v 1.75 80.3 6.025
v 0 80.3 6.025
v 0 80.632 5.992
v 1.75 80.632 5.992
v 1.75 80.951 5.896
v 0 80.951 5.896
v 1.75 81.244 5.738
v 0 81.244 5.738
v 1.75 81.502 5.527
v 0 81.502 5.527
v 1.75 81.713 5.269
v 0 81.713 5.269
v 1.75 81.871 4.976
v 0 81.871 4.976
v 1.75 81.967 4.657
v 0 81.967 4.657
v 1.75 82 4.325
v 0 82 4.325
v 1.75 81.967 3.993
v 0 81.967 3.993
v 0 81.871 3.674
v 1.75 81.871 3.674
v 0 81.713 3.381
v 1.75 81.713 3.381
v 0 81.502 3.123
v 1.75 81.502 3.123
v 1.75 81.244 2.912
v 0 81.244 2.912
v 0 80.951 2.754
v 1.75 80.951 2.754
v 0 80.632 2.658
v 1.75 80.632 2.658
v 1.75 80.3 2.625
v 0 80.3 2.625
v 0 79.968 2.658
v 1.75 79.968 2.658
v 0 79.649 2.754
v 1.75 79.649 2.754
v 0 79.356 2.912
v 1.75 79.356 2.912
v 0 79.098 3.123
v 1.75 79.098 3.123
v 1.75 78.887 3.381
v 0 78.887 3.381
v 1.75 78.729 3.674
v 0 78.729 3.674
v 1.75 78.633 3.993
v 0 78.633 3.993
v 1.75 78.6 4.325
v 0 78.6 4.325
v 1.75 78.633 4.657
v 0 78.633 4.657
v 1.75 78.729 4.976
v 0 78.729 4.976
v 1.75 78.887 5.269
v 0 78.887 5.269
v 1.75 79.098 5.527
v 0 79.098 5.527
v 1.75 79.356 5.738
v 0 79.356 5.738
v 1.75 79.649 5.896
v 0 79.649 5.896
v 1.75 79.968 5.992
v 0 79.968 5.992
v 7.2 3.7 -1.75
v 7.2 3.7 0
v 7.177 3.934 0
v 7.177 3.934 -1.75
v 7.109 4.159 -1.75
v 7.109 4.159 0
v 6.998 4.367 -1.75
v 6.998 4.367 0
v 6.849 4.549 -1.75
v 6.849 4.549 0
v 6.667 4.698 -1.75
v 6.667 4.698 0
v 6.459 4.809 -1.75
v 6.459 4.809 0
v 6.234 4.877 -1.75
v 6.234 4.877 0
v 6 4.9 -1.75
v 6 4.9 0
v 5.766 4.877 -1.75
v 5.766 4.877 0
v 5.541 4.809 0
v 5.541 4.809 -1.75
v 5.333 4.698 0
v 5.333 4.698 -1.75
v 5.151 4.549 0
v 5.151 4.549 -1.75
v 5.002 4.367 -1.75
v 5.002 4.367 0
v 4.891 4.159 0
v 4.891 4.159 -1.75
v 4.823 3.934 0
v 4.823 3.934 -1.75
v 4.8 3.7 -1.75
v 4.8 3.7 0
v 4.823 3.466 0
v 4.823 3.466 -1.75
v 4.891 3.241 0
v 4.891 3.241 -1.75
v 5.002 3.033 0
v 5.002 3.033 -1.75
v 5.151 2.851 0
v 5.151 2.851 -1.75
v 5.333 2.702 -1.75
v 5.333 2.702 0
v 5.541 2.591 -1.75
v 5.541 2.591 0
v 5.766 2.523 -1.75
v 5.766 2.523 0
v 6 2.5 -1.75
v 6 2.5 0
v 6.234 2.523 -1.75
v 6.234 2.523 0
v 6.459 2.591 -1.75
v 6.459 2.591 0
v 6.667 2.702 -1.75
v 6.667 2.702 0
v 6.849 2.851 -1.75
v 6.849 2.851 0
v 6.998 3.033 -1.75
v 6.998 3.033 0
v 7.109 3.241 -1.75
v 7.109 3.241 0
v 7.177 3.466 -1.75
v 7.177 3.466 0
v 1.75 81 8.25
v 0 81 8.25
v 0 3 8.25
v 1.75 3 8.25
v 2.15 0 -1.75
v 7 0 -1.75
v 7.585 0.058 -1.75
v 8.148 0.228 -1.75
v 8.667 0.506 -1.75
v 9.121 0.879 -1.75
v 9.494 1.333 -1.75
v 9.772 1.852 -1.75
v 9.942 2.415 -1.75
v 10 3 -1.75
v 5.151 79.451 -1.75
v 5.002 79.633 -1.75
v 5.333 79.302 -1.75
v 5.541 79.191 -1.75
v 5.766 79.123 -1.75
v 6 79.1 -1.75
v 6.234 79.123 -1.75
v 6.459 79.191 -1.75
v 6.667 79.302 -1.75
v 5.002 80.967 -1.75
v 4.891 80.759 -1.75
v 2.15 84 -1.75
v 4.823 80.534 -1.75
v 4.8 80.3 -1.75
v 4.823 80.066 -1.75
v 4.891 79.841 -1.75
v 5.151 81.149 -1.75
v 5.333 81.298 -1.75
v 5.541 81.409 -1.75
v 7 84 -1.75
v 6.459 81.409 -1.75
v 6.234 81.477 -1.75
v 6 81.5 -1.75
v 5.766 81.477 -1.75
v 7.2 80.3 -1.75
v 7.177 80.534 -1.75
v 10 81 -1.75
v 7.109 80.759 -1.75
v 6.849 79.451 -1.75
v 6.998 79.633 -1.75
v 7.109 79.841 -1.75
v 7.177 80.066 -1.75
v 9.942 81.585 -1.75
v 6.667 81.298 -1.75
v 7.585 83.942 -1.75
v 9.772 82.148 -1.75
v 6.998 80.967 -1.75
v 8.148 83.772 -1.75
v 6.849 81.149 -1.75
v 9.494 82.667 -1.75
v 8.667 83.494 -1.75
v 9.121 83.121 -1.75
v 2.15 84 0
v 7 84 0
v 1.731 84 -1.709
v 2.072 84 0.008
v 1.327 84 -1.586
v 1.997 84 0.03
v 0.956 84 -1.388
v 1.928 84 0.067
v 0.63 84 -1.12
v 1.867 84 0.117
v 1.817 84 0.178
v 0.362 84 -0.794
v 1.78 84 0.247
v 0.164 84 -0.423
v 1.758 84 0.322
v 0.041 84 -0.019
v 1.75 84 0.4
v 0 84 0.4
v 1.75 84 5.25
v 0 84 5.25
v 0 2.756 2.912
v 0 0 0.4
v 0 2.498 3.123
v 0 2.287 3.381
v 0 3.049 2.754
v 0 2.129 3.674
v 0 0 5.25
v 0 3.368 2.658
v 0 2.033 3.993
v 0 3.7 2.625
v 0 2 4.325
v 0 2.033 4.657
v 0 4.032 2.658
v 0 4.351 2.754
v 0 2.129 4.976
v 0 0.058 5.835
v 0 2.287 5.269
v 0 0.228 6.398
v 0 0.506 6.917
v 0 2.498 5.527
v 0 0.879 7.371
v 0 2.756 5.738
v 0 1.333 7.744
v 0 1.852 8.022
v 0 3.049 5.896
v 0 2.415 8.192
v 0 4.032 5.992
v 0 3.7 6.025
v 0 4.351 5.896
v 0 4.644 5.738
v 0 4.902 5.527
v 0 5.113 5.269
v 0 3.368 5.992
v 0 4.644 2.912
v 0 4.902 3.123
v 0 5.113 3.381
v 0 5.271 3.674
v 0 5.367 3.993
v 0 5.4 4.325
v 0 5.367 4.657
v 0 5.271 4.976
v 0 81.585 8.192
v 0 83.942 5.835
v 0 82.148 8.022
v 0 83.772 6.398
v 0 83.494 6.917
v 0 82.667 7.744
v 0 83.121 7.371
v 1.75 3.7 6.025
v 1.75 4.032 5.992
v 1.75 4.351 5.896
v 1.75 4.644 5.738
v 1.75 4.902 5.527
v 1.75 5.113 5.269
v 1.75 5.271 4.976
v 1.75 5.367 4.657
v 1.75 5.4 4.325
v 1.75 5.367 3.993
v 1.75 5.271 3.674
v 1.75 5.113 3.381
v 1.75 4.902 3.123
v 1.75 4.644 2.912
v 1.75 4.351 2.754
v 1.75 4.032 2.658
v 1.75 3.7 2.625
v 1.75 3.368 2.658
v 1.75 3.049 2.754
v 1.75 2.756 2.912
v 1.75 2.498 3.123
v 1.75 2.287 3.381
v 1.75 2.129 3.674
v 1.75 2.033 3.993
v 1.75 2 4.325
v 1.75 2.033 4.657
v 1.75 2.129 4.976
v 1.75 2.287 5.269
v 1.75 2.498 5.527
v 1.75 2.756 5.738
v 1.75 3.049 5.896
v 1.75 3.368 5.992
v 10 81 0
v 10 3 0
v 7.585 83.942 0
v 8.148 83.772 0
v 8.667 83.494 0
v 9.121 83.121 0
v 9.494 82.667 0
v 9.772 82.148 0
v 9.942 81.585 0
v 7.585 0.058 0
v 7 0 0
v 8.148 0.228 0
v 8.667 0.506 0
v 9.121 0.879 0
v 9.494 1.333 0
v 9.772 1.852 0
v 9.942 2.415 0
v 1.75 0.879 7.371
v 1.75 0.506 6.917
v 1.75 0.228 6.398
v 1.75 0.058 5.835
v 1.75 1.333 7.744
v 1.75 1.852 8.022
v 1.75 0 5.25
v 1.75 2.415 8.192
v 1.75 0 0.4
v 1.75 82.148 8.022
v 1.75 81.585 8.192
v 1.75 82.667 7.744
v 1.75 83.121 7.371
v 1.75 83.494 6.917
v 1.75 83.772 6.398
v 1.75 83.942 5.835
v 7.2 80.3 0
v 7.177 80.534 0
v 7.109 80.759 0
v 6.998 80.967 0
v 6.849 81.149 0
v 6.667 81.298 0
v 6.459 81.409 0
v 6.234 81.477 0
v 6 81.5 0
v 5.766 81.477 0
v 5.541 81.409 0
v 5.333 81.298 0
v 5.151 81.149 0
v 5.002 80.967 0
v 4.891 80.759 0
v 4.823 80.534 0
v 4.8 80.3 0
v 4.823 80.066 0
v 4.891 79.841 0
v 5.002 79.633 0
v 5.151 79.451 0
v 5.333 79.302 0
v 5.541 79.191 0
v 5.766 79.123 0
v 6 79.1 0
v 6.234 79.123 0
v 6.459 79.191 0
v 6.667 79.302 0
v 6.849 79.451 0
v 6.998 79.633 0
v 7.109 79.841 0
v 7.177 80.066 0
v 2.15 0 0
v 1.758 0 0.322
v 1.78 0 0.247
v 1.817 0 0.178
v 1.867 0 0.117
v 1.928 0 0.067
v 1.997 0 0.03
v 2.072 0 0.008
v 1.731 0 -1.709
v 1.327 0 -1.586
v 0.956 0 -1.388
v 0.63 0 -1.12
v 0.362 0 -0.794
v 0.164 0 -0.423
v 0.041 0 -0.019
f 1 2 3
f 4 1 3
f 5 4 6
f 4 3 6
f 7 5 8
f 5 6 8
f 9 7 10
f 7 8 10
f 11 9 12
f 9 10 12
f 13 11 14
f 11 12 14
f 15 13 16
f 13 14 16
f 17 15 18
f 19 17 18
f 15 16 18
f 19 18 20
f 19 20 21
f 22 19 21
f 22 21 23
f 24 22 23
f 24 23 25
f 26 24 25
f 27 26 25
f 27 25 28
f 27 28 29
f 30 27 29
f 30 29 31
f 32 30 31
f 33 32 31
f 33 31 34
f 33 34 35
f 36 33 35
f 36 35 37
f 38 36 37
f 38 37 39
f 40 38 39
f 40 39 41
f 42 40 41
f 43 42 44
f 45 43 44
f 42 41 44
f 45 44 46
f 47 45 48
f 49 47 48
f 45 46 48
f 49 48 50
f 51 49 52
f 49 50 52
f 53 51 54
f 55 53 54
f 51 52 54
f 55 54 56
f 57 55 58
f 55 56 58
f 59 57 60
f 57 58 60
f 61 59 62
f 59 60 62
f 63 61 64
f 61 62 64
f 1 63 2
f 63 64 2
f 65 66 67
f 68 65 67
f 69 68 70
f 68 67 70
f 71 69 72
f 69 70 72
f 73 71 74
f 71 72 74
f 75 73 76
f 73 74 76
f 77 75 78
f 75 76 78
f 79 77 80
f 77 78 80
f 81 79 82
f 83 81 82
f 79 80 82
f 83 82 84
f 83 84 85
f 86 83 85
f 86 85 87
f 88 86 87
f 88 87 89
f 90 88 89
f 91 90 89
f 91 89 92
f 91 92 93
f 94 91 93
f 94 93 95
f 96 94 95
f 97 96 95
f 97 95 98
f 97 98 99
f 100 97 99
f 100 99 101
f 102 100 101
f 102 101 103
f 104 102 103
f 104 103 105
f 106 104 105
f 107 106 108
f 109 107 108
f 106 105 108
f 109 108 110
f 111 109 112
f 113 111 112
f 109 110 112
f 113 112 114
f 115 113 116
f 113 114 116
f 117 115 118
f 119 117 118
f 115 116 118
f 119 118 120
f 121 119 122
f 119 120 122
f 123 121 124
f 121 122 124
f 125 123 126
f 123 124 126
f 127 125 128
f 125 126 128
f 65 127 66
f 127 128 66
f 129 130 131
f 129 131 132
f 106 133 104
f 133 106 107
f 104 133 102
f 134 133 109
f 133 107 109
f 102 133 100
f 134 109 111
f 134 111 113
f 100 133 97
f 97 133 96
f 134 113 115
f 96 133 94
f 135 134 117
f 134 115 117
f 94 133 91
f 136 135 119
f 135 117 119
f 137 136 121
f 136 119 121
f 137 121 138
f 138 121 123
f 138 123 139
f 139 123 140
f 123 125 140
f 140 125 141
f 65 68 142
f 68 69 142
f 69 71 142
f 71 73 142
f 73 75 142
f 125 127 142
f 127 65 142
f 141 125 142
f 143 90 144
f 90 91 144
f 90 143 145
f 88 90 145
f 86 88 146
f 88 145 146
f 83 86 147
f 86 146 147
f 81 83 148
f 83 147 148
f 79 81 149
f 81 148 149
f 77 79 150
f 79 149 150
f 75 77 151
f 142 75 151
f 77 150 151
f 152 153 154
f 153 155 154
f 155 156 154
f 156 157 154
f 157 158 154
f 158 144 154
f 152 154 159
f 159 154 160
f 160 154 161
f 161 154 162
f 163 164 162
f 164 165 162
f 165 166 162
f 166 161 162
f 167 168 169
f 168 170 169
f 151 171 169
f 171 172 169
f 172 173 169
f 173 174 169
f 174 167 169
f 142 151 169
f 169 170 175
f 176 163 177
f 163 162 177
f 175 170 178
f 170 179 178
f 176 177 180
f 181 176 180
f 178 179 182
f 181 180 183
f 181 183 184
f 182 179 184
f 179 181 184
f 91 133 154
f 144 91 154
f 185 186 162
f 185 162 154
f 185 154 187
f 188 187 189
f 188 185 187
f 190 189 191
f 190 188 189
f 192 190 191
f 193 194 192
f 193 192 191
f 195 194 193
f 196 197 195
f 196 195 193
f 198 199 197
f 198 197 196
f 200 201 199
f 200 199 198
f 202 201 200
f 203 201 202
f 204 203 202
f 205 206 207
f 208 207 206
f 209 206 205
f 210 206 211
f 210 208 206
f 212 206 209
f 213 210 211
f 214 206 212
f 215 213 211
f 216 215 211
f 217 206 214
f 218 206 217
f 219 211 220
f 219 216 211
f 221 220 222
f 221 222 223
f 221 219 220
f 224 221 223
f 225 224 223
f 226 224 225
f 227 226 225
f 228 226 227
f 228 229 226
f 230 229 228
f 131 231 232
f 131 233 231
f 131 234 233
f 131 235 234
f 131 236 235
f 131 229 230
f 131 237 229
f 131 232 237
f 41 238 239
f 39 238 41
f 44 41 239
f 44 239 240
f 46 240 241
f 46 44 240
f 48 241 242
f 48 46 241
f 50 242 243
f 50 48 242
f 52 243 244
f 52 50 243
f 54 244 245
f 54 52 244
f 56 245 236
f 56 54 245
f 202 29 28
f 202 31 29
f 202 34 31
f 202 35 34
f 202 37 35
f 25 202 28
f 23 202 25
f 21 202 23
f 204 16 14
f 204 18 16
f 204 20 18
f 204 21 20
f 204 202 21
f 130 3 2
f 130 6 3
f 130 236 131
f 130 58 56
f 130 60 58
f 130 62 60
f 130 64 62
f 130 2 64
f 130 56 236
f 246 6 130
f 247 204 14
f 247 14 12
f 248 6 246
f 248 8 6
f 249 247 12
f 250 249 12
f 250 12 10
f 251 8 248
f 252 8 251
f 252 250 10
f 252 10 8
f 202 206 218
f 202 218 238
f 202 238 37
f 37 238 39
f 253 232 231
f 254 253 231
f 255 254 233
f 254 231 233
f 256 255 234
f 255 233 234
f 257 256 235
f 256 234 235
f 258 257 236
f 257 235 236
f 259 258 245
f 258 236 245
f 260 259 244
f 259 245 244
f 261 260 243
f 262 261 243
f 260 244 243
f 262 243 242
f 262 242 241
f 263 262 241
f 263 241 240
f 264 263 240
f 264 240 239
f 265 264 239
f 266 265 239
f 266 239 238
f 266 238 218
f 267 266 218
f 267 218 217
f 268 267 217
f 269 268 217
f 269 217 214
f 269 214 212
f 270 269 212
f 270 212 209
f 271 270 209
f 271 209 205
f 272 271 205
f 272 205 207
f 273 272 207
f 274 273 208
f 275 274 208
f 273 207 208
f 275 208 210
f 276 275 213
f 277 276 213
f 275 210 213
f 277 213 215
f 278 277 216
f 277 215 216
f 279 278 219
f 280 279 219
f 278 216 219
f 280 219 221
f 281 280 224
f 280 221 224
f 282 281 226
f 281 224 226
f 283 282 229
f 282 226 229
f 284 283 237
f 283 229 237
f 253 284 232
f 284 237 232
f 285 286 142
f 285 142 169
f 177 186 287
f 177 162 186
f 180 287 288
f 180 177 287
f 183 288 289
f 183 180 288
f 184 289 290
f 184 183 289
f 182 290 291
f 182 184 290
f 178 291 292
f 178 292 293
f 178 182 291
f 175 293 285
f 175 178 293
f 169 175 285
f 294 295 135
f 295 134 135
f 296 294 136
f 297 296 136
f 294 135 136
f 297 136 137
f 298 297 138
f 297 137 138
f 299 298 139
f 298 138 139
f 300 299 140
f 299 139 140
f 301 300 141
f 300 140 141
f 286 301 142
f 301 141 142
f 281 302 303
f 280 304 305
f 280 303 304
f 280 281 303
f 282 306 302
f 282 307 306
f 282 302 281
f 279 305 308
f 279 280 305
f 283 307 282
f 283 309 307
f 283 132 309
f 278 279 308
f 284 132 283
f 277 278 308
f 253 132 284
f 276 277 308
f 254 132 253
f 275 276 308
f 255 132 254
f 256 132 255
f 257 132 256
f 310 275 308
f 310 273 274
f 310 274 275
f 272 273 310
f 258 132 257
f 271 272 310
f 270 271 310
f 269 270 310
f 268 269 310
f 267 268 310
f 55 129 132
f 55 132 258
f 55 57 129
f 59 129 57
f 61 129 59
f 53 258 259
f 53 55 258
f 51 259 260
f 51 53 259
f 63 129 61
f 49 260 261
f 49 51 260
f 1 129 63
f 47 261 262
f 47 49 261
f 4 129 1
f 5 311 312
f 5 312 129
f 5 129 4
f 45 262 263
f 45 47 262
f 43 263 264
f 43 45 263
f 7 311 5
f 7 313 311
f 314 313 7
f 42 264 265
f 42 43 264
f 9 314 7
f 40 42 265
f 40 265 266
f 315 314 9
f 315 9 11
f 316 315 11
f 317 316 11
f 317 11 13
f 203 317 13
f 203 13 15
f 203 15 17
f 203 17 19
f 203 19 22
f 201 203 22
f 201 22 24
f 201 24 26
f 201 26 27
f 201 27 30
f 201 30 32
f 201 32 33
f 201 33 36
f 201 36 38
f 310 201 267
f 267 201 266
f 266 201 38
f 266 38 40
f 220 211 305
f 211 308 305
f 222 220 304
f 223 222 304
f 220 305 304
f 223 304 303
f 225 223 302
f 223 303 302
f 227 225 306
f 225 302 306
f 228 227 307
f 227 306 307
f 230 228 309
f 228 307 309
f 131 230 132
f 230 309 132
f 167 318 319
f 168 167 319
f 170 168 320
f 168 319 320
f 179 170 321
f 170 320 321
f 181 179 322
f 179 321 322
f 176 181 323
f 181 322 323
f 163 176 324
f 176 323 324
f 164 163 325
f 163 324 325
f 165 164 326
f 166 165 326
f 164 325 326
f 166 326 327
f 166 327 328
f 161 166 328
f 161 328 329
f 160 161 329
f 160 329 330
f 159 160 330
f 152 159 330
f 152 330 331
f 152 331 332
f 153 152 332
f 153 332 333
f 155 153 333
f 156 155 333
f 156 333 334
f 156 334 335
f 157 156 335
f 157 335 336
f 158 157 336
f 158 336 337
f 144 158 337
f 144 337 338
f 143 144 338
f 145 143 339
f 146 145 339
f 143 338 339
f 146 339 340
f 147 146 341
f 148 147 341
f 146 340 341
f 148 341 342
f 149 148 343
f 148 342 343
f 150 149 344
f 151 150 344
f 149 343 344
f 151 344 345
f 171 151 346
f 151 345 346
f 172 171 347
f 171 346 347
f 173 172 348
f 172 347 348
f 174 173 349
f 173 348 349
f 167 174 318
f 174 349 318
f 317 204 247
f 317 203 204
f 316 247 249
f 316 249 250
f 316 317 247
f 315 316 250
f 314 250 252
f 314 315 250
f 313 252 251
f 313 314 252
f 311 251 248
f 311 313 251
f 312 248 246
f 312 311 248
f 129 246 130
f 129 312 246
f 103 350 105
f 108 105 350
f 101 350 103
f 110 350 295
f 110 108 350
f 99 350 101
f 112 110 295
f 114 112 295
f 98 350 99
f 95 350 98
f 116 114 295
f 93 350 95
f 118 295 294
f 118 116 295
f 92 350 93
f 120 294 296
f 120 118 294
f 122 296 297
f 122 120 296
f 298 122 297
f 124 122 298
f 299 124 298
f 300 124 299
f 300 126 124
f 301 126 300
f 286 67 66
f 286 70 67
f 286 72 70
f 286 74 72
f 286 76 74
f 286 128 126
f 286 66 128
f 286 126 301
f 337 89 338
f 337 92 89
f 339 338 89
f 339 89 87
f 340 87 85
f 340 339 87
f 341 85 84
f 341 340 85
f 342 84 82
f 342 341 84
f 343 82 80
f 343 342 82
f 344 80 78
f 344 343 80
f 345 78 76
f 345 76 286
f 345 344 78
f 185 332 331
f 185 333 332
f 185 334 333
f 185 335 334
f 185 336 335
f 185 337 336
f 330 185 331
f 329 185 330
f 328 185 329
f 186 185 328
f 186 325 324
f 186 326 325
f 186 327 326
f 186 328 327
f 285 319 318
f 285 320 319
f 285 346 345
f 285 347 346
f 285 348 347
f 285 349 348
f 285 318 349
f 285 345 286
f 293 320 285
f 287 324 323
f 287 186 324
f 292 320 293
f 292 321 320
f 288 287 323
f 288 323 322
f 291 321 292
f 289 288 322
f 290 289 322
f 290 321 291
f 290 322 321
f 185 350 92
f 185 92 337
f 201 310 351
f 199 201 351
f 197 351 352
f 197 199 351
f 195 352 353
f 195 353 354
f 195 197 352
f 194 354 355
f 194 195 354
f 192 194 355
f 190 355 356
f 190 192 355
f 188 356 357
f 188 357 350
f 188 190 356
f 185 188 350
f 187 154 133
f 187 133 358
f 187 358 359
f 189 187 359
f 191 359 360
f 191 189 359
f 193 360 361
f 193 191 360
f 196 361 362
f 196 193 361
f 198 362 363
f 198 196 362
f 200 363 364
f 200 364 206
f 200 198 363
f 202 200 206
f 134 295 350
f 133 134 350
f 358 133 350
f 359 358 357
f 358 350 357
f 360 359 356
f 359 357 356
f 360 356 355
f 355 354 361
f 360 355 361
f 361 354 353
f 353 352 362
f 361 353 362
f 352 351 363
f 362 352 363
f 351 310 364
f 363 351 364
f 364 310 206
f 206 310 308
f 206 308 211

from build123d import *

# Parameters (mm, degrees)
SKETCH1_W                    = 10
SKETCH1_H                    = 84
BASE_FLANGE1_DEPTH           = 1.75
EDGE_FLANGE1_STRIP_W         = 7.8
EDGE_FLANGE1_STRIP_H         = 1.75
EDGE_FLANGE1_STRIP_CUT_DEPTH = 84
EDGE_FLANGE1_DEPTH           = 84
SSD_MOUNTING_HOLES_D         = 2.4
SPINE_MOUNTING_HOLES_D       = 3.4
FILLET1_R                    = 3


# Sheet-metal steps are written as plain solids
with BuildPart() as part:
    # Sketch1 → Base-Flange1 (new body)
    with BuildSketch(Plane.XY):
        with Locations((5, 42)):
            Rectangle(SKETCH1_W, SKETCH1_H)
    extrude(amount=-BASE_FLANGE1_DEPTH)

    # Edge-Flange1 strip (across the edge) → Edge-Flange1 strip cut (cut)
    with BuildSketch(Plane.XZ.offset(-84)):
        with Locations((-1.75, -0.875)):
            Rectangle(EDGE_FLANGE1_STRIP_W, EDGE_FLANGE1_STRIP_H)
    extrude(amount=EDGE_FLANGE1_STRIP_CUT_DEPTH, mode=Mode.SUBTRACT)

    # Edge-Flange1 section (across the edge) → Edge-Flange1 (add)
    with BuildSketch(Plane.XZ.offset(-84)):
        with BuildLine():
            Line((0, 0.4), (0, 8.25))
            Line((0, 8.25), (1.75, 8.25))
            Line((1.75, 8.25), (1.75, 0.4))
            ThreePointArc((1.75, 0.4), (1.867157288, 0.117157288), (2.15, 0))
            Line((2.15, 0), (2.15, -1.75))
            ThreePointArc((2.15, -1.75), (0.62972042, -1.12027958), (0, 0.4))
        make_face()
    extrude(amount=EDGE_FLANGE1_DEPTH)

    # ssd-mounting-holes (through all)
    with Locations(Plane(origin=(6, 80.3, -1.75), x_dir=(-1, 0, 0), z_dir=(0, 0, -1))):
        with Locations((0, 0), (0, -76.6)):
            Hole(SSD_MOUNTING_HOLES_D / 2)

    # spine-mounting-holes (through all)
    with Locations(Plane(origin=(1.75, 0, 0), x_dir=(0, 0, -1), z_dir=(1, 0, 0))):
        with Locations((-4.325, 80.3), (-4.325, 3.7)):
            Hole(SPINE_MOUNTING_HOLES_D / 2)

    # Fillet1
    fillet1_edges = [part.edges().sort_by_distance(p)[0] for p in [
        (0.875, 84, 8.25),
        (0.875, 0, 8.25),
        (10, 84, -0.875),
        (10, 0, -0.875),
    ]]
    fillet(fillet1_edges, radius=FILLET1_R)


solid = part.part
